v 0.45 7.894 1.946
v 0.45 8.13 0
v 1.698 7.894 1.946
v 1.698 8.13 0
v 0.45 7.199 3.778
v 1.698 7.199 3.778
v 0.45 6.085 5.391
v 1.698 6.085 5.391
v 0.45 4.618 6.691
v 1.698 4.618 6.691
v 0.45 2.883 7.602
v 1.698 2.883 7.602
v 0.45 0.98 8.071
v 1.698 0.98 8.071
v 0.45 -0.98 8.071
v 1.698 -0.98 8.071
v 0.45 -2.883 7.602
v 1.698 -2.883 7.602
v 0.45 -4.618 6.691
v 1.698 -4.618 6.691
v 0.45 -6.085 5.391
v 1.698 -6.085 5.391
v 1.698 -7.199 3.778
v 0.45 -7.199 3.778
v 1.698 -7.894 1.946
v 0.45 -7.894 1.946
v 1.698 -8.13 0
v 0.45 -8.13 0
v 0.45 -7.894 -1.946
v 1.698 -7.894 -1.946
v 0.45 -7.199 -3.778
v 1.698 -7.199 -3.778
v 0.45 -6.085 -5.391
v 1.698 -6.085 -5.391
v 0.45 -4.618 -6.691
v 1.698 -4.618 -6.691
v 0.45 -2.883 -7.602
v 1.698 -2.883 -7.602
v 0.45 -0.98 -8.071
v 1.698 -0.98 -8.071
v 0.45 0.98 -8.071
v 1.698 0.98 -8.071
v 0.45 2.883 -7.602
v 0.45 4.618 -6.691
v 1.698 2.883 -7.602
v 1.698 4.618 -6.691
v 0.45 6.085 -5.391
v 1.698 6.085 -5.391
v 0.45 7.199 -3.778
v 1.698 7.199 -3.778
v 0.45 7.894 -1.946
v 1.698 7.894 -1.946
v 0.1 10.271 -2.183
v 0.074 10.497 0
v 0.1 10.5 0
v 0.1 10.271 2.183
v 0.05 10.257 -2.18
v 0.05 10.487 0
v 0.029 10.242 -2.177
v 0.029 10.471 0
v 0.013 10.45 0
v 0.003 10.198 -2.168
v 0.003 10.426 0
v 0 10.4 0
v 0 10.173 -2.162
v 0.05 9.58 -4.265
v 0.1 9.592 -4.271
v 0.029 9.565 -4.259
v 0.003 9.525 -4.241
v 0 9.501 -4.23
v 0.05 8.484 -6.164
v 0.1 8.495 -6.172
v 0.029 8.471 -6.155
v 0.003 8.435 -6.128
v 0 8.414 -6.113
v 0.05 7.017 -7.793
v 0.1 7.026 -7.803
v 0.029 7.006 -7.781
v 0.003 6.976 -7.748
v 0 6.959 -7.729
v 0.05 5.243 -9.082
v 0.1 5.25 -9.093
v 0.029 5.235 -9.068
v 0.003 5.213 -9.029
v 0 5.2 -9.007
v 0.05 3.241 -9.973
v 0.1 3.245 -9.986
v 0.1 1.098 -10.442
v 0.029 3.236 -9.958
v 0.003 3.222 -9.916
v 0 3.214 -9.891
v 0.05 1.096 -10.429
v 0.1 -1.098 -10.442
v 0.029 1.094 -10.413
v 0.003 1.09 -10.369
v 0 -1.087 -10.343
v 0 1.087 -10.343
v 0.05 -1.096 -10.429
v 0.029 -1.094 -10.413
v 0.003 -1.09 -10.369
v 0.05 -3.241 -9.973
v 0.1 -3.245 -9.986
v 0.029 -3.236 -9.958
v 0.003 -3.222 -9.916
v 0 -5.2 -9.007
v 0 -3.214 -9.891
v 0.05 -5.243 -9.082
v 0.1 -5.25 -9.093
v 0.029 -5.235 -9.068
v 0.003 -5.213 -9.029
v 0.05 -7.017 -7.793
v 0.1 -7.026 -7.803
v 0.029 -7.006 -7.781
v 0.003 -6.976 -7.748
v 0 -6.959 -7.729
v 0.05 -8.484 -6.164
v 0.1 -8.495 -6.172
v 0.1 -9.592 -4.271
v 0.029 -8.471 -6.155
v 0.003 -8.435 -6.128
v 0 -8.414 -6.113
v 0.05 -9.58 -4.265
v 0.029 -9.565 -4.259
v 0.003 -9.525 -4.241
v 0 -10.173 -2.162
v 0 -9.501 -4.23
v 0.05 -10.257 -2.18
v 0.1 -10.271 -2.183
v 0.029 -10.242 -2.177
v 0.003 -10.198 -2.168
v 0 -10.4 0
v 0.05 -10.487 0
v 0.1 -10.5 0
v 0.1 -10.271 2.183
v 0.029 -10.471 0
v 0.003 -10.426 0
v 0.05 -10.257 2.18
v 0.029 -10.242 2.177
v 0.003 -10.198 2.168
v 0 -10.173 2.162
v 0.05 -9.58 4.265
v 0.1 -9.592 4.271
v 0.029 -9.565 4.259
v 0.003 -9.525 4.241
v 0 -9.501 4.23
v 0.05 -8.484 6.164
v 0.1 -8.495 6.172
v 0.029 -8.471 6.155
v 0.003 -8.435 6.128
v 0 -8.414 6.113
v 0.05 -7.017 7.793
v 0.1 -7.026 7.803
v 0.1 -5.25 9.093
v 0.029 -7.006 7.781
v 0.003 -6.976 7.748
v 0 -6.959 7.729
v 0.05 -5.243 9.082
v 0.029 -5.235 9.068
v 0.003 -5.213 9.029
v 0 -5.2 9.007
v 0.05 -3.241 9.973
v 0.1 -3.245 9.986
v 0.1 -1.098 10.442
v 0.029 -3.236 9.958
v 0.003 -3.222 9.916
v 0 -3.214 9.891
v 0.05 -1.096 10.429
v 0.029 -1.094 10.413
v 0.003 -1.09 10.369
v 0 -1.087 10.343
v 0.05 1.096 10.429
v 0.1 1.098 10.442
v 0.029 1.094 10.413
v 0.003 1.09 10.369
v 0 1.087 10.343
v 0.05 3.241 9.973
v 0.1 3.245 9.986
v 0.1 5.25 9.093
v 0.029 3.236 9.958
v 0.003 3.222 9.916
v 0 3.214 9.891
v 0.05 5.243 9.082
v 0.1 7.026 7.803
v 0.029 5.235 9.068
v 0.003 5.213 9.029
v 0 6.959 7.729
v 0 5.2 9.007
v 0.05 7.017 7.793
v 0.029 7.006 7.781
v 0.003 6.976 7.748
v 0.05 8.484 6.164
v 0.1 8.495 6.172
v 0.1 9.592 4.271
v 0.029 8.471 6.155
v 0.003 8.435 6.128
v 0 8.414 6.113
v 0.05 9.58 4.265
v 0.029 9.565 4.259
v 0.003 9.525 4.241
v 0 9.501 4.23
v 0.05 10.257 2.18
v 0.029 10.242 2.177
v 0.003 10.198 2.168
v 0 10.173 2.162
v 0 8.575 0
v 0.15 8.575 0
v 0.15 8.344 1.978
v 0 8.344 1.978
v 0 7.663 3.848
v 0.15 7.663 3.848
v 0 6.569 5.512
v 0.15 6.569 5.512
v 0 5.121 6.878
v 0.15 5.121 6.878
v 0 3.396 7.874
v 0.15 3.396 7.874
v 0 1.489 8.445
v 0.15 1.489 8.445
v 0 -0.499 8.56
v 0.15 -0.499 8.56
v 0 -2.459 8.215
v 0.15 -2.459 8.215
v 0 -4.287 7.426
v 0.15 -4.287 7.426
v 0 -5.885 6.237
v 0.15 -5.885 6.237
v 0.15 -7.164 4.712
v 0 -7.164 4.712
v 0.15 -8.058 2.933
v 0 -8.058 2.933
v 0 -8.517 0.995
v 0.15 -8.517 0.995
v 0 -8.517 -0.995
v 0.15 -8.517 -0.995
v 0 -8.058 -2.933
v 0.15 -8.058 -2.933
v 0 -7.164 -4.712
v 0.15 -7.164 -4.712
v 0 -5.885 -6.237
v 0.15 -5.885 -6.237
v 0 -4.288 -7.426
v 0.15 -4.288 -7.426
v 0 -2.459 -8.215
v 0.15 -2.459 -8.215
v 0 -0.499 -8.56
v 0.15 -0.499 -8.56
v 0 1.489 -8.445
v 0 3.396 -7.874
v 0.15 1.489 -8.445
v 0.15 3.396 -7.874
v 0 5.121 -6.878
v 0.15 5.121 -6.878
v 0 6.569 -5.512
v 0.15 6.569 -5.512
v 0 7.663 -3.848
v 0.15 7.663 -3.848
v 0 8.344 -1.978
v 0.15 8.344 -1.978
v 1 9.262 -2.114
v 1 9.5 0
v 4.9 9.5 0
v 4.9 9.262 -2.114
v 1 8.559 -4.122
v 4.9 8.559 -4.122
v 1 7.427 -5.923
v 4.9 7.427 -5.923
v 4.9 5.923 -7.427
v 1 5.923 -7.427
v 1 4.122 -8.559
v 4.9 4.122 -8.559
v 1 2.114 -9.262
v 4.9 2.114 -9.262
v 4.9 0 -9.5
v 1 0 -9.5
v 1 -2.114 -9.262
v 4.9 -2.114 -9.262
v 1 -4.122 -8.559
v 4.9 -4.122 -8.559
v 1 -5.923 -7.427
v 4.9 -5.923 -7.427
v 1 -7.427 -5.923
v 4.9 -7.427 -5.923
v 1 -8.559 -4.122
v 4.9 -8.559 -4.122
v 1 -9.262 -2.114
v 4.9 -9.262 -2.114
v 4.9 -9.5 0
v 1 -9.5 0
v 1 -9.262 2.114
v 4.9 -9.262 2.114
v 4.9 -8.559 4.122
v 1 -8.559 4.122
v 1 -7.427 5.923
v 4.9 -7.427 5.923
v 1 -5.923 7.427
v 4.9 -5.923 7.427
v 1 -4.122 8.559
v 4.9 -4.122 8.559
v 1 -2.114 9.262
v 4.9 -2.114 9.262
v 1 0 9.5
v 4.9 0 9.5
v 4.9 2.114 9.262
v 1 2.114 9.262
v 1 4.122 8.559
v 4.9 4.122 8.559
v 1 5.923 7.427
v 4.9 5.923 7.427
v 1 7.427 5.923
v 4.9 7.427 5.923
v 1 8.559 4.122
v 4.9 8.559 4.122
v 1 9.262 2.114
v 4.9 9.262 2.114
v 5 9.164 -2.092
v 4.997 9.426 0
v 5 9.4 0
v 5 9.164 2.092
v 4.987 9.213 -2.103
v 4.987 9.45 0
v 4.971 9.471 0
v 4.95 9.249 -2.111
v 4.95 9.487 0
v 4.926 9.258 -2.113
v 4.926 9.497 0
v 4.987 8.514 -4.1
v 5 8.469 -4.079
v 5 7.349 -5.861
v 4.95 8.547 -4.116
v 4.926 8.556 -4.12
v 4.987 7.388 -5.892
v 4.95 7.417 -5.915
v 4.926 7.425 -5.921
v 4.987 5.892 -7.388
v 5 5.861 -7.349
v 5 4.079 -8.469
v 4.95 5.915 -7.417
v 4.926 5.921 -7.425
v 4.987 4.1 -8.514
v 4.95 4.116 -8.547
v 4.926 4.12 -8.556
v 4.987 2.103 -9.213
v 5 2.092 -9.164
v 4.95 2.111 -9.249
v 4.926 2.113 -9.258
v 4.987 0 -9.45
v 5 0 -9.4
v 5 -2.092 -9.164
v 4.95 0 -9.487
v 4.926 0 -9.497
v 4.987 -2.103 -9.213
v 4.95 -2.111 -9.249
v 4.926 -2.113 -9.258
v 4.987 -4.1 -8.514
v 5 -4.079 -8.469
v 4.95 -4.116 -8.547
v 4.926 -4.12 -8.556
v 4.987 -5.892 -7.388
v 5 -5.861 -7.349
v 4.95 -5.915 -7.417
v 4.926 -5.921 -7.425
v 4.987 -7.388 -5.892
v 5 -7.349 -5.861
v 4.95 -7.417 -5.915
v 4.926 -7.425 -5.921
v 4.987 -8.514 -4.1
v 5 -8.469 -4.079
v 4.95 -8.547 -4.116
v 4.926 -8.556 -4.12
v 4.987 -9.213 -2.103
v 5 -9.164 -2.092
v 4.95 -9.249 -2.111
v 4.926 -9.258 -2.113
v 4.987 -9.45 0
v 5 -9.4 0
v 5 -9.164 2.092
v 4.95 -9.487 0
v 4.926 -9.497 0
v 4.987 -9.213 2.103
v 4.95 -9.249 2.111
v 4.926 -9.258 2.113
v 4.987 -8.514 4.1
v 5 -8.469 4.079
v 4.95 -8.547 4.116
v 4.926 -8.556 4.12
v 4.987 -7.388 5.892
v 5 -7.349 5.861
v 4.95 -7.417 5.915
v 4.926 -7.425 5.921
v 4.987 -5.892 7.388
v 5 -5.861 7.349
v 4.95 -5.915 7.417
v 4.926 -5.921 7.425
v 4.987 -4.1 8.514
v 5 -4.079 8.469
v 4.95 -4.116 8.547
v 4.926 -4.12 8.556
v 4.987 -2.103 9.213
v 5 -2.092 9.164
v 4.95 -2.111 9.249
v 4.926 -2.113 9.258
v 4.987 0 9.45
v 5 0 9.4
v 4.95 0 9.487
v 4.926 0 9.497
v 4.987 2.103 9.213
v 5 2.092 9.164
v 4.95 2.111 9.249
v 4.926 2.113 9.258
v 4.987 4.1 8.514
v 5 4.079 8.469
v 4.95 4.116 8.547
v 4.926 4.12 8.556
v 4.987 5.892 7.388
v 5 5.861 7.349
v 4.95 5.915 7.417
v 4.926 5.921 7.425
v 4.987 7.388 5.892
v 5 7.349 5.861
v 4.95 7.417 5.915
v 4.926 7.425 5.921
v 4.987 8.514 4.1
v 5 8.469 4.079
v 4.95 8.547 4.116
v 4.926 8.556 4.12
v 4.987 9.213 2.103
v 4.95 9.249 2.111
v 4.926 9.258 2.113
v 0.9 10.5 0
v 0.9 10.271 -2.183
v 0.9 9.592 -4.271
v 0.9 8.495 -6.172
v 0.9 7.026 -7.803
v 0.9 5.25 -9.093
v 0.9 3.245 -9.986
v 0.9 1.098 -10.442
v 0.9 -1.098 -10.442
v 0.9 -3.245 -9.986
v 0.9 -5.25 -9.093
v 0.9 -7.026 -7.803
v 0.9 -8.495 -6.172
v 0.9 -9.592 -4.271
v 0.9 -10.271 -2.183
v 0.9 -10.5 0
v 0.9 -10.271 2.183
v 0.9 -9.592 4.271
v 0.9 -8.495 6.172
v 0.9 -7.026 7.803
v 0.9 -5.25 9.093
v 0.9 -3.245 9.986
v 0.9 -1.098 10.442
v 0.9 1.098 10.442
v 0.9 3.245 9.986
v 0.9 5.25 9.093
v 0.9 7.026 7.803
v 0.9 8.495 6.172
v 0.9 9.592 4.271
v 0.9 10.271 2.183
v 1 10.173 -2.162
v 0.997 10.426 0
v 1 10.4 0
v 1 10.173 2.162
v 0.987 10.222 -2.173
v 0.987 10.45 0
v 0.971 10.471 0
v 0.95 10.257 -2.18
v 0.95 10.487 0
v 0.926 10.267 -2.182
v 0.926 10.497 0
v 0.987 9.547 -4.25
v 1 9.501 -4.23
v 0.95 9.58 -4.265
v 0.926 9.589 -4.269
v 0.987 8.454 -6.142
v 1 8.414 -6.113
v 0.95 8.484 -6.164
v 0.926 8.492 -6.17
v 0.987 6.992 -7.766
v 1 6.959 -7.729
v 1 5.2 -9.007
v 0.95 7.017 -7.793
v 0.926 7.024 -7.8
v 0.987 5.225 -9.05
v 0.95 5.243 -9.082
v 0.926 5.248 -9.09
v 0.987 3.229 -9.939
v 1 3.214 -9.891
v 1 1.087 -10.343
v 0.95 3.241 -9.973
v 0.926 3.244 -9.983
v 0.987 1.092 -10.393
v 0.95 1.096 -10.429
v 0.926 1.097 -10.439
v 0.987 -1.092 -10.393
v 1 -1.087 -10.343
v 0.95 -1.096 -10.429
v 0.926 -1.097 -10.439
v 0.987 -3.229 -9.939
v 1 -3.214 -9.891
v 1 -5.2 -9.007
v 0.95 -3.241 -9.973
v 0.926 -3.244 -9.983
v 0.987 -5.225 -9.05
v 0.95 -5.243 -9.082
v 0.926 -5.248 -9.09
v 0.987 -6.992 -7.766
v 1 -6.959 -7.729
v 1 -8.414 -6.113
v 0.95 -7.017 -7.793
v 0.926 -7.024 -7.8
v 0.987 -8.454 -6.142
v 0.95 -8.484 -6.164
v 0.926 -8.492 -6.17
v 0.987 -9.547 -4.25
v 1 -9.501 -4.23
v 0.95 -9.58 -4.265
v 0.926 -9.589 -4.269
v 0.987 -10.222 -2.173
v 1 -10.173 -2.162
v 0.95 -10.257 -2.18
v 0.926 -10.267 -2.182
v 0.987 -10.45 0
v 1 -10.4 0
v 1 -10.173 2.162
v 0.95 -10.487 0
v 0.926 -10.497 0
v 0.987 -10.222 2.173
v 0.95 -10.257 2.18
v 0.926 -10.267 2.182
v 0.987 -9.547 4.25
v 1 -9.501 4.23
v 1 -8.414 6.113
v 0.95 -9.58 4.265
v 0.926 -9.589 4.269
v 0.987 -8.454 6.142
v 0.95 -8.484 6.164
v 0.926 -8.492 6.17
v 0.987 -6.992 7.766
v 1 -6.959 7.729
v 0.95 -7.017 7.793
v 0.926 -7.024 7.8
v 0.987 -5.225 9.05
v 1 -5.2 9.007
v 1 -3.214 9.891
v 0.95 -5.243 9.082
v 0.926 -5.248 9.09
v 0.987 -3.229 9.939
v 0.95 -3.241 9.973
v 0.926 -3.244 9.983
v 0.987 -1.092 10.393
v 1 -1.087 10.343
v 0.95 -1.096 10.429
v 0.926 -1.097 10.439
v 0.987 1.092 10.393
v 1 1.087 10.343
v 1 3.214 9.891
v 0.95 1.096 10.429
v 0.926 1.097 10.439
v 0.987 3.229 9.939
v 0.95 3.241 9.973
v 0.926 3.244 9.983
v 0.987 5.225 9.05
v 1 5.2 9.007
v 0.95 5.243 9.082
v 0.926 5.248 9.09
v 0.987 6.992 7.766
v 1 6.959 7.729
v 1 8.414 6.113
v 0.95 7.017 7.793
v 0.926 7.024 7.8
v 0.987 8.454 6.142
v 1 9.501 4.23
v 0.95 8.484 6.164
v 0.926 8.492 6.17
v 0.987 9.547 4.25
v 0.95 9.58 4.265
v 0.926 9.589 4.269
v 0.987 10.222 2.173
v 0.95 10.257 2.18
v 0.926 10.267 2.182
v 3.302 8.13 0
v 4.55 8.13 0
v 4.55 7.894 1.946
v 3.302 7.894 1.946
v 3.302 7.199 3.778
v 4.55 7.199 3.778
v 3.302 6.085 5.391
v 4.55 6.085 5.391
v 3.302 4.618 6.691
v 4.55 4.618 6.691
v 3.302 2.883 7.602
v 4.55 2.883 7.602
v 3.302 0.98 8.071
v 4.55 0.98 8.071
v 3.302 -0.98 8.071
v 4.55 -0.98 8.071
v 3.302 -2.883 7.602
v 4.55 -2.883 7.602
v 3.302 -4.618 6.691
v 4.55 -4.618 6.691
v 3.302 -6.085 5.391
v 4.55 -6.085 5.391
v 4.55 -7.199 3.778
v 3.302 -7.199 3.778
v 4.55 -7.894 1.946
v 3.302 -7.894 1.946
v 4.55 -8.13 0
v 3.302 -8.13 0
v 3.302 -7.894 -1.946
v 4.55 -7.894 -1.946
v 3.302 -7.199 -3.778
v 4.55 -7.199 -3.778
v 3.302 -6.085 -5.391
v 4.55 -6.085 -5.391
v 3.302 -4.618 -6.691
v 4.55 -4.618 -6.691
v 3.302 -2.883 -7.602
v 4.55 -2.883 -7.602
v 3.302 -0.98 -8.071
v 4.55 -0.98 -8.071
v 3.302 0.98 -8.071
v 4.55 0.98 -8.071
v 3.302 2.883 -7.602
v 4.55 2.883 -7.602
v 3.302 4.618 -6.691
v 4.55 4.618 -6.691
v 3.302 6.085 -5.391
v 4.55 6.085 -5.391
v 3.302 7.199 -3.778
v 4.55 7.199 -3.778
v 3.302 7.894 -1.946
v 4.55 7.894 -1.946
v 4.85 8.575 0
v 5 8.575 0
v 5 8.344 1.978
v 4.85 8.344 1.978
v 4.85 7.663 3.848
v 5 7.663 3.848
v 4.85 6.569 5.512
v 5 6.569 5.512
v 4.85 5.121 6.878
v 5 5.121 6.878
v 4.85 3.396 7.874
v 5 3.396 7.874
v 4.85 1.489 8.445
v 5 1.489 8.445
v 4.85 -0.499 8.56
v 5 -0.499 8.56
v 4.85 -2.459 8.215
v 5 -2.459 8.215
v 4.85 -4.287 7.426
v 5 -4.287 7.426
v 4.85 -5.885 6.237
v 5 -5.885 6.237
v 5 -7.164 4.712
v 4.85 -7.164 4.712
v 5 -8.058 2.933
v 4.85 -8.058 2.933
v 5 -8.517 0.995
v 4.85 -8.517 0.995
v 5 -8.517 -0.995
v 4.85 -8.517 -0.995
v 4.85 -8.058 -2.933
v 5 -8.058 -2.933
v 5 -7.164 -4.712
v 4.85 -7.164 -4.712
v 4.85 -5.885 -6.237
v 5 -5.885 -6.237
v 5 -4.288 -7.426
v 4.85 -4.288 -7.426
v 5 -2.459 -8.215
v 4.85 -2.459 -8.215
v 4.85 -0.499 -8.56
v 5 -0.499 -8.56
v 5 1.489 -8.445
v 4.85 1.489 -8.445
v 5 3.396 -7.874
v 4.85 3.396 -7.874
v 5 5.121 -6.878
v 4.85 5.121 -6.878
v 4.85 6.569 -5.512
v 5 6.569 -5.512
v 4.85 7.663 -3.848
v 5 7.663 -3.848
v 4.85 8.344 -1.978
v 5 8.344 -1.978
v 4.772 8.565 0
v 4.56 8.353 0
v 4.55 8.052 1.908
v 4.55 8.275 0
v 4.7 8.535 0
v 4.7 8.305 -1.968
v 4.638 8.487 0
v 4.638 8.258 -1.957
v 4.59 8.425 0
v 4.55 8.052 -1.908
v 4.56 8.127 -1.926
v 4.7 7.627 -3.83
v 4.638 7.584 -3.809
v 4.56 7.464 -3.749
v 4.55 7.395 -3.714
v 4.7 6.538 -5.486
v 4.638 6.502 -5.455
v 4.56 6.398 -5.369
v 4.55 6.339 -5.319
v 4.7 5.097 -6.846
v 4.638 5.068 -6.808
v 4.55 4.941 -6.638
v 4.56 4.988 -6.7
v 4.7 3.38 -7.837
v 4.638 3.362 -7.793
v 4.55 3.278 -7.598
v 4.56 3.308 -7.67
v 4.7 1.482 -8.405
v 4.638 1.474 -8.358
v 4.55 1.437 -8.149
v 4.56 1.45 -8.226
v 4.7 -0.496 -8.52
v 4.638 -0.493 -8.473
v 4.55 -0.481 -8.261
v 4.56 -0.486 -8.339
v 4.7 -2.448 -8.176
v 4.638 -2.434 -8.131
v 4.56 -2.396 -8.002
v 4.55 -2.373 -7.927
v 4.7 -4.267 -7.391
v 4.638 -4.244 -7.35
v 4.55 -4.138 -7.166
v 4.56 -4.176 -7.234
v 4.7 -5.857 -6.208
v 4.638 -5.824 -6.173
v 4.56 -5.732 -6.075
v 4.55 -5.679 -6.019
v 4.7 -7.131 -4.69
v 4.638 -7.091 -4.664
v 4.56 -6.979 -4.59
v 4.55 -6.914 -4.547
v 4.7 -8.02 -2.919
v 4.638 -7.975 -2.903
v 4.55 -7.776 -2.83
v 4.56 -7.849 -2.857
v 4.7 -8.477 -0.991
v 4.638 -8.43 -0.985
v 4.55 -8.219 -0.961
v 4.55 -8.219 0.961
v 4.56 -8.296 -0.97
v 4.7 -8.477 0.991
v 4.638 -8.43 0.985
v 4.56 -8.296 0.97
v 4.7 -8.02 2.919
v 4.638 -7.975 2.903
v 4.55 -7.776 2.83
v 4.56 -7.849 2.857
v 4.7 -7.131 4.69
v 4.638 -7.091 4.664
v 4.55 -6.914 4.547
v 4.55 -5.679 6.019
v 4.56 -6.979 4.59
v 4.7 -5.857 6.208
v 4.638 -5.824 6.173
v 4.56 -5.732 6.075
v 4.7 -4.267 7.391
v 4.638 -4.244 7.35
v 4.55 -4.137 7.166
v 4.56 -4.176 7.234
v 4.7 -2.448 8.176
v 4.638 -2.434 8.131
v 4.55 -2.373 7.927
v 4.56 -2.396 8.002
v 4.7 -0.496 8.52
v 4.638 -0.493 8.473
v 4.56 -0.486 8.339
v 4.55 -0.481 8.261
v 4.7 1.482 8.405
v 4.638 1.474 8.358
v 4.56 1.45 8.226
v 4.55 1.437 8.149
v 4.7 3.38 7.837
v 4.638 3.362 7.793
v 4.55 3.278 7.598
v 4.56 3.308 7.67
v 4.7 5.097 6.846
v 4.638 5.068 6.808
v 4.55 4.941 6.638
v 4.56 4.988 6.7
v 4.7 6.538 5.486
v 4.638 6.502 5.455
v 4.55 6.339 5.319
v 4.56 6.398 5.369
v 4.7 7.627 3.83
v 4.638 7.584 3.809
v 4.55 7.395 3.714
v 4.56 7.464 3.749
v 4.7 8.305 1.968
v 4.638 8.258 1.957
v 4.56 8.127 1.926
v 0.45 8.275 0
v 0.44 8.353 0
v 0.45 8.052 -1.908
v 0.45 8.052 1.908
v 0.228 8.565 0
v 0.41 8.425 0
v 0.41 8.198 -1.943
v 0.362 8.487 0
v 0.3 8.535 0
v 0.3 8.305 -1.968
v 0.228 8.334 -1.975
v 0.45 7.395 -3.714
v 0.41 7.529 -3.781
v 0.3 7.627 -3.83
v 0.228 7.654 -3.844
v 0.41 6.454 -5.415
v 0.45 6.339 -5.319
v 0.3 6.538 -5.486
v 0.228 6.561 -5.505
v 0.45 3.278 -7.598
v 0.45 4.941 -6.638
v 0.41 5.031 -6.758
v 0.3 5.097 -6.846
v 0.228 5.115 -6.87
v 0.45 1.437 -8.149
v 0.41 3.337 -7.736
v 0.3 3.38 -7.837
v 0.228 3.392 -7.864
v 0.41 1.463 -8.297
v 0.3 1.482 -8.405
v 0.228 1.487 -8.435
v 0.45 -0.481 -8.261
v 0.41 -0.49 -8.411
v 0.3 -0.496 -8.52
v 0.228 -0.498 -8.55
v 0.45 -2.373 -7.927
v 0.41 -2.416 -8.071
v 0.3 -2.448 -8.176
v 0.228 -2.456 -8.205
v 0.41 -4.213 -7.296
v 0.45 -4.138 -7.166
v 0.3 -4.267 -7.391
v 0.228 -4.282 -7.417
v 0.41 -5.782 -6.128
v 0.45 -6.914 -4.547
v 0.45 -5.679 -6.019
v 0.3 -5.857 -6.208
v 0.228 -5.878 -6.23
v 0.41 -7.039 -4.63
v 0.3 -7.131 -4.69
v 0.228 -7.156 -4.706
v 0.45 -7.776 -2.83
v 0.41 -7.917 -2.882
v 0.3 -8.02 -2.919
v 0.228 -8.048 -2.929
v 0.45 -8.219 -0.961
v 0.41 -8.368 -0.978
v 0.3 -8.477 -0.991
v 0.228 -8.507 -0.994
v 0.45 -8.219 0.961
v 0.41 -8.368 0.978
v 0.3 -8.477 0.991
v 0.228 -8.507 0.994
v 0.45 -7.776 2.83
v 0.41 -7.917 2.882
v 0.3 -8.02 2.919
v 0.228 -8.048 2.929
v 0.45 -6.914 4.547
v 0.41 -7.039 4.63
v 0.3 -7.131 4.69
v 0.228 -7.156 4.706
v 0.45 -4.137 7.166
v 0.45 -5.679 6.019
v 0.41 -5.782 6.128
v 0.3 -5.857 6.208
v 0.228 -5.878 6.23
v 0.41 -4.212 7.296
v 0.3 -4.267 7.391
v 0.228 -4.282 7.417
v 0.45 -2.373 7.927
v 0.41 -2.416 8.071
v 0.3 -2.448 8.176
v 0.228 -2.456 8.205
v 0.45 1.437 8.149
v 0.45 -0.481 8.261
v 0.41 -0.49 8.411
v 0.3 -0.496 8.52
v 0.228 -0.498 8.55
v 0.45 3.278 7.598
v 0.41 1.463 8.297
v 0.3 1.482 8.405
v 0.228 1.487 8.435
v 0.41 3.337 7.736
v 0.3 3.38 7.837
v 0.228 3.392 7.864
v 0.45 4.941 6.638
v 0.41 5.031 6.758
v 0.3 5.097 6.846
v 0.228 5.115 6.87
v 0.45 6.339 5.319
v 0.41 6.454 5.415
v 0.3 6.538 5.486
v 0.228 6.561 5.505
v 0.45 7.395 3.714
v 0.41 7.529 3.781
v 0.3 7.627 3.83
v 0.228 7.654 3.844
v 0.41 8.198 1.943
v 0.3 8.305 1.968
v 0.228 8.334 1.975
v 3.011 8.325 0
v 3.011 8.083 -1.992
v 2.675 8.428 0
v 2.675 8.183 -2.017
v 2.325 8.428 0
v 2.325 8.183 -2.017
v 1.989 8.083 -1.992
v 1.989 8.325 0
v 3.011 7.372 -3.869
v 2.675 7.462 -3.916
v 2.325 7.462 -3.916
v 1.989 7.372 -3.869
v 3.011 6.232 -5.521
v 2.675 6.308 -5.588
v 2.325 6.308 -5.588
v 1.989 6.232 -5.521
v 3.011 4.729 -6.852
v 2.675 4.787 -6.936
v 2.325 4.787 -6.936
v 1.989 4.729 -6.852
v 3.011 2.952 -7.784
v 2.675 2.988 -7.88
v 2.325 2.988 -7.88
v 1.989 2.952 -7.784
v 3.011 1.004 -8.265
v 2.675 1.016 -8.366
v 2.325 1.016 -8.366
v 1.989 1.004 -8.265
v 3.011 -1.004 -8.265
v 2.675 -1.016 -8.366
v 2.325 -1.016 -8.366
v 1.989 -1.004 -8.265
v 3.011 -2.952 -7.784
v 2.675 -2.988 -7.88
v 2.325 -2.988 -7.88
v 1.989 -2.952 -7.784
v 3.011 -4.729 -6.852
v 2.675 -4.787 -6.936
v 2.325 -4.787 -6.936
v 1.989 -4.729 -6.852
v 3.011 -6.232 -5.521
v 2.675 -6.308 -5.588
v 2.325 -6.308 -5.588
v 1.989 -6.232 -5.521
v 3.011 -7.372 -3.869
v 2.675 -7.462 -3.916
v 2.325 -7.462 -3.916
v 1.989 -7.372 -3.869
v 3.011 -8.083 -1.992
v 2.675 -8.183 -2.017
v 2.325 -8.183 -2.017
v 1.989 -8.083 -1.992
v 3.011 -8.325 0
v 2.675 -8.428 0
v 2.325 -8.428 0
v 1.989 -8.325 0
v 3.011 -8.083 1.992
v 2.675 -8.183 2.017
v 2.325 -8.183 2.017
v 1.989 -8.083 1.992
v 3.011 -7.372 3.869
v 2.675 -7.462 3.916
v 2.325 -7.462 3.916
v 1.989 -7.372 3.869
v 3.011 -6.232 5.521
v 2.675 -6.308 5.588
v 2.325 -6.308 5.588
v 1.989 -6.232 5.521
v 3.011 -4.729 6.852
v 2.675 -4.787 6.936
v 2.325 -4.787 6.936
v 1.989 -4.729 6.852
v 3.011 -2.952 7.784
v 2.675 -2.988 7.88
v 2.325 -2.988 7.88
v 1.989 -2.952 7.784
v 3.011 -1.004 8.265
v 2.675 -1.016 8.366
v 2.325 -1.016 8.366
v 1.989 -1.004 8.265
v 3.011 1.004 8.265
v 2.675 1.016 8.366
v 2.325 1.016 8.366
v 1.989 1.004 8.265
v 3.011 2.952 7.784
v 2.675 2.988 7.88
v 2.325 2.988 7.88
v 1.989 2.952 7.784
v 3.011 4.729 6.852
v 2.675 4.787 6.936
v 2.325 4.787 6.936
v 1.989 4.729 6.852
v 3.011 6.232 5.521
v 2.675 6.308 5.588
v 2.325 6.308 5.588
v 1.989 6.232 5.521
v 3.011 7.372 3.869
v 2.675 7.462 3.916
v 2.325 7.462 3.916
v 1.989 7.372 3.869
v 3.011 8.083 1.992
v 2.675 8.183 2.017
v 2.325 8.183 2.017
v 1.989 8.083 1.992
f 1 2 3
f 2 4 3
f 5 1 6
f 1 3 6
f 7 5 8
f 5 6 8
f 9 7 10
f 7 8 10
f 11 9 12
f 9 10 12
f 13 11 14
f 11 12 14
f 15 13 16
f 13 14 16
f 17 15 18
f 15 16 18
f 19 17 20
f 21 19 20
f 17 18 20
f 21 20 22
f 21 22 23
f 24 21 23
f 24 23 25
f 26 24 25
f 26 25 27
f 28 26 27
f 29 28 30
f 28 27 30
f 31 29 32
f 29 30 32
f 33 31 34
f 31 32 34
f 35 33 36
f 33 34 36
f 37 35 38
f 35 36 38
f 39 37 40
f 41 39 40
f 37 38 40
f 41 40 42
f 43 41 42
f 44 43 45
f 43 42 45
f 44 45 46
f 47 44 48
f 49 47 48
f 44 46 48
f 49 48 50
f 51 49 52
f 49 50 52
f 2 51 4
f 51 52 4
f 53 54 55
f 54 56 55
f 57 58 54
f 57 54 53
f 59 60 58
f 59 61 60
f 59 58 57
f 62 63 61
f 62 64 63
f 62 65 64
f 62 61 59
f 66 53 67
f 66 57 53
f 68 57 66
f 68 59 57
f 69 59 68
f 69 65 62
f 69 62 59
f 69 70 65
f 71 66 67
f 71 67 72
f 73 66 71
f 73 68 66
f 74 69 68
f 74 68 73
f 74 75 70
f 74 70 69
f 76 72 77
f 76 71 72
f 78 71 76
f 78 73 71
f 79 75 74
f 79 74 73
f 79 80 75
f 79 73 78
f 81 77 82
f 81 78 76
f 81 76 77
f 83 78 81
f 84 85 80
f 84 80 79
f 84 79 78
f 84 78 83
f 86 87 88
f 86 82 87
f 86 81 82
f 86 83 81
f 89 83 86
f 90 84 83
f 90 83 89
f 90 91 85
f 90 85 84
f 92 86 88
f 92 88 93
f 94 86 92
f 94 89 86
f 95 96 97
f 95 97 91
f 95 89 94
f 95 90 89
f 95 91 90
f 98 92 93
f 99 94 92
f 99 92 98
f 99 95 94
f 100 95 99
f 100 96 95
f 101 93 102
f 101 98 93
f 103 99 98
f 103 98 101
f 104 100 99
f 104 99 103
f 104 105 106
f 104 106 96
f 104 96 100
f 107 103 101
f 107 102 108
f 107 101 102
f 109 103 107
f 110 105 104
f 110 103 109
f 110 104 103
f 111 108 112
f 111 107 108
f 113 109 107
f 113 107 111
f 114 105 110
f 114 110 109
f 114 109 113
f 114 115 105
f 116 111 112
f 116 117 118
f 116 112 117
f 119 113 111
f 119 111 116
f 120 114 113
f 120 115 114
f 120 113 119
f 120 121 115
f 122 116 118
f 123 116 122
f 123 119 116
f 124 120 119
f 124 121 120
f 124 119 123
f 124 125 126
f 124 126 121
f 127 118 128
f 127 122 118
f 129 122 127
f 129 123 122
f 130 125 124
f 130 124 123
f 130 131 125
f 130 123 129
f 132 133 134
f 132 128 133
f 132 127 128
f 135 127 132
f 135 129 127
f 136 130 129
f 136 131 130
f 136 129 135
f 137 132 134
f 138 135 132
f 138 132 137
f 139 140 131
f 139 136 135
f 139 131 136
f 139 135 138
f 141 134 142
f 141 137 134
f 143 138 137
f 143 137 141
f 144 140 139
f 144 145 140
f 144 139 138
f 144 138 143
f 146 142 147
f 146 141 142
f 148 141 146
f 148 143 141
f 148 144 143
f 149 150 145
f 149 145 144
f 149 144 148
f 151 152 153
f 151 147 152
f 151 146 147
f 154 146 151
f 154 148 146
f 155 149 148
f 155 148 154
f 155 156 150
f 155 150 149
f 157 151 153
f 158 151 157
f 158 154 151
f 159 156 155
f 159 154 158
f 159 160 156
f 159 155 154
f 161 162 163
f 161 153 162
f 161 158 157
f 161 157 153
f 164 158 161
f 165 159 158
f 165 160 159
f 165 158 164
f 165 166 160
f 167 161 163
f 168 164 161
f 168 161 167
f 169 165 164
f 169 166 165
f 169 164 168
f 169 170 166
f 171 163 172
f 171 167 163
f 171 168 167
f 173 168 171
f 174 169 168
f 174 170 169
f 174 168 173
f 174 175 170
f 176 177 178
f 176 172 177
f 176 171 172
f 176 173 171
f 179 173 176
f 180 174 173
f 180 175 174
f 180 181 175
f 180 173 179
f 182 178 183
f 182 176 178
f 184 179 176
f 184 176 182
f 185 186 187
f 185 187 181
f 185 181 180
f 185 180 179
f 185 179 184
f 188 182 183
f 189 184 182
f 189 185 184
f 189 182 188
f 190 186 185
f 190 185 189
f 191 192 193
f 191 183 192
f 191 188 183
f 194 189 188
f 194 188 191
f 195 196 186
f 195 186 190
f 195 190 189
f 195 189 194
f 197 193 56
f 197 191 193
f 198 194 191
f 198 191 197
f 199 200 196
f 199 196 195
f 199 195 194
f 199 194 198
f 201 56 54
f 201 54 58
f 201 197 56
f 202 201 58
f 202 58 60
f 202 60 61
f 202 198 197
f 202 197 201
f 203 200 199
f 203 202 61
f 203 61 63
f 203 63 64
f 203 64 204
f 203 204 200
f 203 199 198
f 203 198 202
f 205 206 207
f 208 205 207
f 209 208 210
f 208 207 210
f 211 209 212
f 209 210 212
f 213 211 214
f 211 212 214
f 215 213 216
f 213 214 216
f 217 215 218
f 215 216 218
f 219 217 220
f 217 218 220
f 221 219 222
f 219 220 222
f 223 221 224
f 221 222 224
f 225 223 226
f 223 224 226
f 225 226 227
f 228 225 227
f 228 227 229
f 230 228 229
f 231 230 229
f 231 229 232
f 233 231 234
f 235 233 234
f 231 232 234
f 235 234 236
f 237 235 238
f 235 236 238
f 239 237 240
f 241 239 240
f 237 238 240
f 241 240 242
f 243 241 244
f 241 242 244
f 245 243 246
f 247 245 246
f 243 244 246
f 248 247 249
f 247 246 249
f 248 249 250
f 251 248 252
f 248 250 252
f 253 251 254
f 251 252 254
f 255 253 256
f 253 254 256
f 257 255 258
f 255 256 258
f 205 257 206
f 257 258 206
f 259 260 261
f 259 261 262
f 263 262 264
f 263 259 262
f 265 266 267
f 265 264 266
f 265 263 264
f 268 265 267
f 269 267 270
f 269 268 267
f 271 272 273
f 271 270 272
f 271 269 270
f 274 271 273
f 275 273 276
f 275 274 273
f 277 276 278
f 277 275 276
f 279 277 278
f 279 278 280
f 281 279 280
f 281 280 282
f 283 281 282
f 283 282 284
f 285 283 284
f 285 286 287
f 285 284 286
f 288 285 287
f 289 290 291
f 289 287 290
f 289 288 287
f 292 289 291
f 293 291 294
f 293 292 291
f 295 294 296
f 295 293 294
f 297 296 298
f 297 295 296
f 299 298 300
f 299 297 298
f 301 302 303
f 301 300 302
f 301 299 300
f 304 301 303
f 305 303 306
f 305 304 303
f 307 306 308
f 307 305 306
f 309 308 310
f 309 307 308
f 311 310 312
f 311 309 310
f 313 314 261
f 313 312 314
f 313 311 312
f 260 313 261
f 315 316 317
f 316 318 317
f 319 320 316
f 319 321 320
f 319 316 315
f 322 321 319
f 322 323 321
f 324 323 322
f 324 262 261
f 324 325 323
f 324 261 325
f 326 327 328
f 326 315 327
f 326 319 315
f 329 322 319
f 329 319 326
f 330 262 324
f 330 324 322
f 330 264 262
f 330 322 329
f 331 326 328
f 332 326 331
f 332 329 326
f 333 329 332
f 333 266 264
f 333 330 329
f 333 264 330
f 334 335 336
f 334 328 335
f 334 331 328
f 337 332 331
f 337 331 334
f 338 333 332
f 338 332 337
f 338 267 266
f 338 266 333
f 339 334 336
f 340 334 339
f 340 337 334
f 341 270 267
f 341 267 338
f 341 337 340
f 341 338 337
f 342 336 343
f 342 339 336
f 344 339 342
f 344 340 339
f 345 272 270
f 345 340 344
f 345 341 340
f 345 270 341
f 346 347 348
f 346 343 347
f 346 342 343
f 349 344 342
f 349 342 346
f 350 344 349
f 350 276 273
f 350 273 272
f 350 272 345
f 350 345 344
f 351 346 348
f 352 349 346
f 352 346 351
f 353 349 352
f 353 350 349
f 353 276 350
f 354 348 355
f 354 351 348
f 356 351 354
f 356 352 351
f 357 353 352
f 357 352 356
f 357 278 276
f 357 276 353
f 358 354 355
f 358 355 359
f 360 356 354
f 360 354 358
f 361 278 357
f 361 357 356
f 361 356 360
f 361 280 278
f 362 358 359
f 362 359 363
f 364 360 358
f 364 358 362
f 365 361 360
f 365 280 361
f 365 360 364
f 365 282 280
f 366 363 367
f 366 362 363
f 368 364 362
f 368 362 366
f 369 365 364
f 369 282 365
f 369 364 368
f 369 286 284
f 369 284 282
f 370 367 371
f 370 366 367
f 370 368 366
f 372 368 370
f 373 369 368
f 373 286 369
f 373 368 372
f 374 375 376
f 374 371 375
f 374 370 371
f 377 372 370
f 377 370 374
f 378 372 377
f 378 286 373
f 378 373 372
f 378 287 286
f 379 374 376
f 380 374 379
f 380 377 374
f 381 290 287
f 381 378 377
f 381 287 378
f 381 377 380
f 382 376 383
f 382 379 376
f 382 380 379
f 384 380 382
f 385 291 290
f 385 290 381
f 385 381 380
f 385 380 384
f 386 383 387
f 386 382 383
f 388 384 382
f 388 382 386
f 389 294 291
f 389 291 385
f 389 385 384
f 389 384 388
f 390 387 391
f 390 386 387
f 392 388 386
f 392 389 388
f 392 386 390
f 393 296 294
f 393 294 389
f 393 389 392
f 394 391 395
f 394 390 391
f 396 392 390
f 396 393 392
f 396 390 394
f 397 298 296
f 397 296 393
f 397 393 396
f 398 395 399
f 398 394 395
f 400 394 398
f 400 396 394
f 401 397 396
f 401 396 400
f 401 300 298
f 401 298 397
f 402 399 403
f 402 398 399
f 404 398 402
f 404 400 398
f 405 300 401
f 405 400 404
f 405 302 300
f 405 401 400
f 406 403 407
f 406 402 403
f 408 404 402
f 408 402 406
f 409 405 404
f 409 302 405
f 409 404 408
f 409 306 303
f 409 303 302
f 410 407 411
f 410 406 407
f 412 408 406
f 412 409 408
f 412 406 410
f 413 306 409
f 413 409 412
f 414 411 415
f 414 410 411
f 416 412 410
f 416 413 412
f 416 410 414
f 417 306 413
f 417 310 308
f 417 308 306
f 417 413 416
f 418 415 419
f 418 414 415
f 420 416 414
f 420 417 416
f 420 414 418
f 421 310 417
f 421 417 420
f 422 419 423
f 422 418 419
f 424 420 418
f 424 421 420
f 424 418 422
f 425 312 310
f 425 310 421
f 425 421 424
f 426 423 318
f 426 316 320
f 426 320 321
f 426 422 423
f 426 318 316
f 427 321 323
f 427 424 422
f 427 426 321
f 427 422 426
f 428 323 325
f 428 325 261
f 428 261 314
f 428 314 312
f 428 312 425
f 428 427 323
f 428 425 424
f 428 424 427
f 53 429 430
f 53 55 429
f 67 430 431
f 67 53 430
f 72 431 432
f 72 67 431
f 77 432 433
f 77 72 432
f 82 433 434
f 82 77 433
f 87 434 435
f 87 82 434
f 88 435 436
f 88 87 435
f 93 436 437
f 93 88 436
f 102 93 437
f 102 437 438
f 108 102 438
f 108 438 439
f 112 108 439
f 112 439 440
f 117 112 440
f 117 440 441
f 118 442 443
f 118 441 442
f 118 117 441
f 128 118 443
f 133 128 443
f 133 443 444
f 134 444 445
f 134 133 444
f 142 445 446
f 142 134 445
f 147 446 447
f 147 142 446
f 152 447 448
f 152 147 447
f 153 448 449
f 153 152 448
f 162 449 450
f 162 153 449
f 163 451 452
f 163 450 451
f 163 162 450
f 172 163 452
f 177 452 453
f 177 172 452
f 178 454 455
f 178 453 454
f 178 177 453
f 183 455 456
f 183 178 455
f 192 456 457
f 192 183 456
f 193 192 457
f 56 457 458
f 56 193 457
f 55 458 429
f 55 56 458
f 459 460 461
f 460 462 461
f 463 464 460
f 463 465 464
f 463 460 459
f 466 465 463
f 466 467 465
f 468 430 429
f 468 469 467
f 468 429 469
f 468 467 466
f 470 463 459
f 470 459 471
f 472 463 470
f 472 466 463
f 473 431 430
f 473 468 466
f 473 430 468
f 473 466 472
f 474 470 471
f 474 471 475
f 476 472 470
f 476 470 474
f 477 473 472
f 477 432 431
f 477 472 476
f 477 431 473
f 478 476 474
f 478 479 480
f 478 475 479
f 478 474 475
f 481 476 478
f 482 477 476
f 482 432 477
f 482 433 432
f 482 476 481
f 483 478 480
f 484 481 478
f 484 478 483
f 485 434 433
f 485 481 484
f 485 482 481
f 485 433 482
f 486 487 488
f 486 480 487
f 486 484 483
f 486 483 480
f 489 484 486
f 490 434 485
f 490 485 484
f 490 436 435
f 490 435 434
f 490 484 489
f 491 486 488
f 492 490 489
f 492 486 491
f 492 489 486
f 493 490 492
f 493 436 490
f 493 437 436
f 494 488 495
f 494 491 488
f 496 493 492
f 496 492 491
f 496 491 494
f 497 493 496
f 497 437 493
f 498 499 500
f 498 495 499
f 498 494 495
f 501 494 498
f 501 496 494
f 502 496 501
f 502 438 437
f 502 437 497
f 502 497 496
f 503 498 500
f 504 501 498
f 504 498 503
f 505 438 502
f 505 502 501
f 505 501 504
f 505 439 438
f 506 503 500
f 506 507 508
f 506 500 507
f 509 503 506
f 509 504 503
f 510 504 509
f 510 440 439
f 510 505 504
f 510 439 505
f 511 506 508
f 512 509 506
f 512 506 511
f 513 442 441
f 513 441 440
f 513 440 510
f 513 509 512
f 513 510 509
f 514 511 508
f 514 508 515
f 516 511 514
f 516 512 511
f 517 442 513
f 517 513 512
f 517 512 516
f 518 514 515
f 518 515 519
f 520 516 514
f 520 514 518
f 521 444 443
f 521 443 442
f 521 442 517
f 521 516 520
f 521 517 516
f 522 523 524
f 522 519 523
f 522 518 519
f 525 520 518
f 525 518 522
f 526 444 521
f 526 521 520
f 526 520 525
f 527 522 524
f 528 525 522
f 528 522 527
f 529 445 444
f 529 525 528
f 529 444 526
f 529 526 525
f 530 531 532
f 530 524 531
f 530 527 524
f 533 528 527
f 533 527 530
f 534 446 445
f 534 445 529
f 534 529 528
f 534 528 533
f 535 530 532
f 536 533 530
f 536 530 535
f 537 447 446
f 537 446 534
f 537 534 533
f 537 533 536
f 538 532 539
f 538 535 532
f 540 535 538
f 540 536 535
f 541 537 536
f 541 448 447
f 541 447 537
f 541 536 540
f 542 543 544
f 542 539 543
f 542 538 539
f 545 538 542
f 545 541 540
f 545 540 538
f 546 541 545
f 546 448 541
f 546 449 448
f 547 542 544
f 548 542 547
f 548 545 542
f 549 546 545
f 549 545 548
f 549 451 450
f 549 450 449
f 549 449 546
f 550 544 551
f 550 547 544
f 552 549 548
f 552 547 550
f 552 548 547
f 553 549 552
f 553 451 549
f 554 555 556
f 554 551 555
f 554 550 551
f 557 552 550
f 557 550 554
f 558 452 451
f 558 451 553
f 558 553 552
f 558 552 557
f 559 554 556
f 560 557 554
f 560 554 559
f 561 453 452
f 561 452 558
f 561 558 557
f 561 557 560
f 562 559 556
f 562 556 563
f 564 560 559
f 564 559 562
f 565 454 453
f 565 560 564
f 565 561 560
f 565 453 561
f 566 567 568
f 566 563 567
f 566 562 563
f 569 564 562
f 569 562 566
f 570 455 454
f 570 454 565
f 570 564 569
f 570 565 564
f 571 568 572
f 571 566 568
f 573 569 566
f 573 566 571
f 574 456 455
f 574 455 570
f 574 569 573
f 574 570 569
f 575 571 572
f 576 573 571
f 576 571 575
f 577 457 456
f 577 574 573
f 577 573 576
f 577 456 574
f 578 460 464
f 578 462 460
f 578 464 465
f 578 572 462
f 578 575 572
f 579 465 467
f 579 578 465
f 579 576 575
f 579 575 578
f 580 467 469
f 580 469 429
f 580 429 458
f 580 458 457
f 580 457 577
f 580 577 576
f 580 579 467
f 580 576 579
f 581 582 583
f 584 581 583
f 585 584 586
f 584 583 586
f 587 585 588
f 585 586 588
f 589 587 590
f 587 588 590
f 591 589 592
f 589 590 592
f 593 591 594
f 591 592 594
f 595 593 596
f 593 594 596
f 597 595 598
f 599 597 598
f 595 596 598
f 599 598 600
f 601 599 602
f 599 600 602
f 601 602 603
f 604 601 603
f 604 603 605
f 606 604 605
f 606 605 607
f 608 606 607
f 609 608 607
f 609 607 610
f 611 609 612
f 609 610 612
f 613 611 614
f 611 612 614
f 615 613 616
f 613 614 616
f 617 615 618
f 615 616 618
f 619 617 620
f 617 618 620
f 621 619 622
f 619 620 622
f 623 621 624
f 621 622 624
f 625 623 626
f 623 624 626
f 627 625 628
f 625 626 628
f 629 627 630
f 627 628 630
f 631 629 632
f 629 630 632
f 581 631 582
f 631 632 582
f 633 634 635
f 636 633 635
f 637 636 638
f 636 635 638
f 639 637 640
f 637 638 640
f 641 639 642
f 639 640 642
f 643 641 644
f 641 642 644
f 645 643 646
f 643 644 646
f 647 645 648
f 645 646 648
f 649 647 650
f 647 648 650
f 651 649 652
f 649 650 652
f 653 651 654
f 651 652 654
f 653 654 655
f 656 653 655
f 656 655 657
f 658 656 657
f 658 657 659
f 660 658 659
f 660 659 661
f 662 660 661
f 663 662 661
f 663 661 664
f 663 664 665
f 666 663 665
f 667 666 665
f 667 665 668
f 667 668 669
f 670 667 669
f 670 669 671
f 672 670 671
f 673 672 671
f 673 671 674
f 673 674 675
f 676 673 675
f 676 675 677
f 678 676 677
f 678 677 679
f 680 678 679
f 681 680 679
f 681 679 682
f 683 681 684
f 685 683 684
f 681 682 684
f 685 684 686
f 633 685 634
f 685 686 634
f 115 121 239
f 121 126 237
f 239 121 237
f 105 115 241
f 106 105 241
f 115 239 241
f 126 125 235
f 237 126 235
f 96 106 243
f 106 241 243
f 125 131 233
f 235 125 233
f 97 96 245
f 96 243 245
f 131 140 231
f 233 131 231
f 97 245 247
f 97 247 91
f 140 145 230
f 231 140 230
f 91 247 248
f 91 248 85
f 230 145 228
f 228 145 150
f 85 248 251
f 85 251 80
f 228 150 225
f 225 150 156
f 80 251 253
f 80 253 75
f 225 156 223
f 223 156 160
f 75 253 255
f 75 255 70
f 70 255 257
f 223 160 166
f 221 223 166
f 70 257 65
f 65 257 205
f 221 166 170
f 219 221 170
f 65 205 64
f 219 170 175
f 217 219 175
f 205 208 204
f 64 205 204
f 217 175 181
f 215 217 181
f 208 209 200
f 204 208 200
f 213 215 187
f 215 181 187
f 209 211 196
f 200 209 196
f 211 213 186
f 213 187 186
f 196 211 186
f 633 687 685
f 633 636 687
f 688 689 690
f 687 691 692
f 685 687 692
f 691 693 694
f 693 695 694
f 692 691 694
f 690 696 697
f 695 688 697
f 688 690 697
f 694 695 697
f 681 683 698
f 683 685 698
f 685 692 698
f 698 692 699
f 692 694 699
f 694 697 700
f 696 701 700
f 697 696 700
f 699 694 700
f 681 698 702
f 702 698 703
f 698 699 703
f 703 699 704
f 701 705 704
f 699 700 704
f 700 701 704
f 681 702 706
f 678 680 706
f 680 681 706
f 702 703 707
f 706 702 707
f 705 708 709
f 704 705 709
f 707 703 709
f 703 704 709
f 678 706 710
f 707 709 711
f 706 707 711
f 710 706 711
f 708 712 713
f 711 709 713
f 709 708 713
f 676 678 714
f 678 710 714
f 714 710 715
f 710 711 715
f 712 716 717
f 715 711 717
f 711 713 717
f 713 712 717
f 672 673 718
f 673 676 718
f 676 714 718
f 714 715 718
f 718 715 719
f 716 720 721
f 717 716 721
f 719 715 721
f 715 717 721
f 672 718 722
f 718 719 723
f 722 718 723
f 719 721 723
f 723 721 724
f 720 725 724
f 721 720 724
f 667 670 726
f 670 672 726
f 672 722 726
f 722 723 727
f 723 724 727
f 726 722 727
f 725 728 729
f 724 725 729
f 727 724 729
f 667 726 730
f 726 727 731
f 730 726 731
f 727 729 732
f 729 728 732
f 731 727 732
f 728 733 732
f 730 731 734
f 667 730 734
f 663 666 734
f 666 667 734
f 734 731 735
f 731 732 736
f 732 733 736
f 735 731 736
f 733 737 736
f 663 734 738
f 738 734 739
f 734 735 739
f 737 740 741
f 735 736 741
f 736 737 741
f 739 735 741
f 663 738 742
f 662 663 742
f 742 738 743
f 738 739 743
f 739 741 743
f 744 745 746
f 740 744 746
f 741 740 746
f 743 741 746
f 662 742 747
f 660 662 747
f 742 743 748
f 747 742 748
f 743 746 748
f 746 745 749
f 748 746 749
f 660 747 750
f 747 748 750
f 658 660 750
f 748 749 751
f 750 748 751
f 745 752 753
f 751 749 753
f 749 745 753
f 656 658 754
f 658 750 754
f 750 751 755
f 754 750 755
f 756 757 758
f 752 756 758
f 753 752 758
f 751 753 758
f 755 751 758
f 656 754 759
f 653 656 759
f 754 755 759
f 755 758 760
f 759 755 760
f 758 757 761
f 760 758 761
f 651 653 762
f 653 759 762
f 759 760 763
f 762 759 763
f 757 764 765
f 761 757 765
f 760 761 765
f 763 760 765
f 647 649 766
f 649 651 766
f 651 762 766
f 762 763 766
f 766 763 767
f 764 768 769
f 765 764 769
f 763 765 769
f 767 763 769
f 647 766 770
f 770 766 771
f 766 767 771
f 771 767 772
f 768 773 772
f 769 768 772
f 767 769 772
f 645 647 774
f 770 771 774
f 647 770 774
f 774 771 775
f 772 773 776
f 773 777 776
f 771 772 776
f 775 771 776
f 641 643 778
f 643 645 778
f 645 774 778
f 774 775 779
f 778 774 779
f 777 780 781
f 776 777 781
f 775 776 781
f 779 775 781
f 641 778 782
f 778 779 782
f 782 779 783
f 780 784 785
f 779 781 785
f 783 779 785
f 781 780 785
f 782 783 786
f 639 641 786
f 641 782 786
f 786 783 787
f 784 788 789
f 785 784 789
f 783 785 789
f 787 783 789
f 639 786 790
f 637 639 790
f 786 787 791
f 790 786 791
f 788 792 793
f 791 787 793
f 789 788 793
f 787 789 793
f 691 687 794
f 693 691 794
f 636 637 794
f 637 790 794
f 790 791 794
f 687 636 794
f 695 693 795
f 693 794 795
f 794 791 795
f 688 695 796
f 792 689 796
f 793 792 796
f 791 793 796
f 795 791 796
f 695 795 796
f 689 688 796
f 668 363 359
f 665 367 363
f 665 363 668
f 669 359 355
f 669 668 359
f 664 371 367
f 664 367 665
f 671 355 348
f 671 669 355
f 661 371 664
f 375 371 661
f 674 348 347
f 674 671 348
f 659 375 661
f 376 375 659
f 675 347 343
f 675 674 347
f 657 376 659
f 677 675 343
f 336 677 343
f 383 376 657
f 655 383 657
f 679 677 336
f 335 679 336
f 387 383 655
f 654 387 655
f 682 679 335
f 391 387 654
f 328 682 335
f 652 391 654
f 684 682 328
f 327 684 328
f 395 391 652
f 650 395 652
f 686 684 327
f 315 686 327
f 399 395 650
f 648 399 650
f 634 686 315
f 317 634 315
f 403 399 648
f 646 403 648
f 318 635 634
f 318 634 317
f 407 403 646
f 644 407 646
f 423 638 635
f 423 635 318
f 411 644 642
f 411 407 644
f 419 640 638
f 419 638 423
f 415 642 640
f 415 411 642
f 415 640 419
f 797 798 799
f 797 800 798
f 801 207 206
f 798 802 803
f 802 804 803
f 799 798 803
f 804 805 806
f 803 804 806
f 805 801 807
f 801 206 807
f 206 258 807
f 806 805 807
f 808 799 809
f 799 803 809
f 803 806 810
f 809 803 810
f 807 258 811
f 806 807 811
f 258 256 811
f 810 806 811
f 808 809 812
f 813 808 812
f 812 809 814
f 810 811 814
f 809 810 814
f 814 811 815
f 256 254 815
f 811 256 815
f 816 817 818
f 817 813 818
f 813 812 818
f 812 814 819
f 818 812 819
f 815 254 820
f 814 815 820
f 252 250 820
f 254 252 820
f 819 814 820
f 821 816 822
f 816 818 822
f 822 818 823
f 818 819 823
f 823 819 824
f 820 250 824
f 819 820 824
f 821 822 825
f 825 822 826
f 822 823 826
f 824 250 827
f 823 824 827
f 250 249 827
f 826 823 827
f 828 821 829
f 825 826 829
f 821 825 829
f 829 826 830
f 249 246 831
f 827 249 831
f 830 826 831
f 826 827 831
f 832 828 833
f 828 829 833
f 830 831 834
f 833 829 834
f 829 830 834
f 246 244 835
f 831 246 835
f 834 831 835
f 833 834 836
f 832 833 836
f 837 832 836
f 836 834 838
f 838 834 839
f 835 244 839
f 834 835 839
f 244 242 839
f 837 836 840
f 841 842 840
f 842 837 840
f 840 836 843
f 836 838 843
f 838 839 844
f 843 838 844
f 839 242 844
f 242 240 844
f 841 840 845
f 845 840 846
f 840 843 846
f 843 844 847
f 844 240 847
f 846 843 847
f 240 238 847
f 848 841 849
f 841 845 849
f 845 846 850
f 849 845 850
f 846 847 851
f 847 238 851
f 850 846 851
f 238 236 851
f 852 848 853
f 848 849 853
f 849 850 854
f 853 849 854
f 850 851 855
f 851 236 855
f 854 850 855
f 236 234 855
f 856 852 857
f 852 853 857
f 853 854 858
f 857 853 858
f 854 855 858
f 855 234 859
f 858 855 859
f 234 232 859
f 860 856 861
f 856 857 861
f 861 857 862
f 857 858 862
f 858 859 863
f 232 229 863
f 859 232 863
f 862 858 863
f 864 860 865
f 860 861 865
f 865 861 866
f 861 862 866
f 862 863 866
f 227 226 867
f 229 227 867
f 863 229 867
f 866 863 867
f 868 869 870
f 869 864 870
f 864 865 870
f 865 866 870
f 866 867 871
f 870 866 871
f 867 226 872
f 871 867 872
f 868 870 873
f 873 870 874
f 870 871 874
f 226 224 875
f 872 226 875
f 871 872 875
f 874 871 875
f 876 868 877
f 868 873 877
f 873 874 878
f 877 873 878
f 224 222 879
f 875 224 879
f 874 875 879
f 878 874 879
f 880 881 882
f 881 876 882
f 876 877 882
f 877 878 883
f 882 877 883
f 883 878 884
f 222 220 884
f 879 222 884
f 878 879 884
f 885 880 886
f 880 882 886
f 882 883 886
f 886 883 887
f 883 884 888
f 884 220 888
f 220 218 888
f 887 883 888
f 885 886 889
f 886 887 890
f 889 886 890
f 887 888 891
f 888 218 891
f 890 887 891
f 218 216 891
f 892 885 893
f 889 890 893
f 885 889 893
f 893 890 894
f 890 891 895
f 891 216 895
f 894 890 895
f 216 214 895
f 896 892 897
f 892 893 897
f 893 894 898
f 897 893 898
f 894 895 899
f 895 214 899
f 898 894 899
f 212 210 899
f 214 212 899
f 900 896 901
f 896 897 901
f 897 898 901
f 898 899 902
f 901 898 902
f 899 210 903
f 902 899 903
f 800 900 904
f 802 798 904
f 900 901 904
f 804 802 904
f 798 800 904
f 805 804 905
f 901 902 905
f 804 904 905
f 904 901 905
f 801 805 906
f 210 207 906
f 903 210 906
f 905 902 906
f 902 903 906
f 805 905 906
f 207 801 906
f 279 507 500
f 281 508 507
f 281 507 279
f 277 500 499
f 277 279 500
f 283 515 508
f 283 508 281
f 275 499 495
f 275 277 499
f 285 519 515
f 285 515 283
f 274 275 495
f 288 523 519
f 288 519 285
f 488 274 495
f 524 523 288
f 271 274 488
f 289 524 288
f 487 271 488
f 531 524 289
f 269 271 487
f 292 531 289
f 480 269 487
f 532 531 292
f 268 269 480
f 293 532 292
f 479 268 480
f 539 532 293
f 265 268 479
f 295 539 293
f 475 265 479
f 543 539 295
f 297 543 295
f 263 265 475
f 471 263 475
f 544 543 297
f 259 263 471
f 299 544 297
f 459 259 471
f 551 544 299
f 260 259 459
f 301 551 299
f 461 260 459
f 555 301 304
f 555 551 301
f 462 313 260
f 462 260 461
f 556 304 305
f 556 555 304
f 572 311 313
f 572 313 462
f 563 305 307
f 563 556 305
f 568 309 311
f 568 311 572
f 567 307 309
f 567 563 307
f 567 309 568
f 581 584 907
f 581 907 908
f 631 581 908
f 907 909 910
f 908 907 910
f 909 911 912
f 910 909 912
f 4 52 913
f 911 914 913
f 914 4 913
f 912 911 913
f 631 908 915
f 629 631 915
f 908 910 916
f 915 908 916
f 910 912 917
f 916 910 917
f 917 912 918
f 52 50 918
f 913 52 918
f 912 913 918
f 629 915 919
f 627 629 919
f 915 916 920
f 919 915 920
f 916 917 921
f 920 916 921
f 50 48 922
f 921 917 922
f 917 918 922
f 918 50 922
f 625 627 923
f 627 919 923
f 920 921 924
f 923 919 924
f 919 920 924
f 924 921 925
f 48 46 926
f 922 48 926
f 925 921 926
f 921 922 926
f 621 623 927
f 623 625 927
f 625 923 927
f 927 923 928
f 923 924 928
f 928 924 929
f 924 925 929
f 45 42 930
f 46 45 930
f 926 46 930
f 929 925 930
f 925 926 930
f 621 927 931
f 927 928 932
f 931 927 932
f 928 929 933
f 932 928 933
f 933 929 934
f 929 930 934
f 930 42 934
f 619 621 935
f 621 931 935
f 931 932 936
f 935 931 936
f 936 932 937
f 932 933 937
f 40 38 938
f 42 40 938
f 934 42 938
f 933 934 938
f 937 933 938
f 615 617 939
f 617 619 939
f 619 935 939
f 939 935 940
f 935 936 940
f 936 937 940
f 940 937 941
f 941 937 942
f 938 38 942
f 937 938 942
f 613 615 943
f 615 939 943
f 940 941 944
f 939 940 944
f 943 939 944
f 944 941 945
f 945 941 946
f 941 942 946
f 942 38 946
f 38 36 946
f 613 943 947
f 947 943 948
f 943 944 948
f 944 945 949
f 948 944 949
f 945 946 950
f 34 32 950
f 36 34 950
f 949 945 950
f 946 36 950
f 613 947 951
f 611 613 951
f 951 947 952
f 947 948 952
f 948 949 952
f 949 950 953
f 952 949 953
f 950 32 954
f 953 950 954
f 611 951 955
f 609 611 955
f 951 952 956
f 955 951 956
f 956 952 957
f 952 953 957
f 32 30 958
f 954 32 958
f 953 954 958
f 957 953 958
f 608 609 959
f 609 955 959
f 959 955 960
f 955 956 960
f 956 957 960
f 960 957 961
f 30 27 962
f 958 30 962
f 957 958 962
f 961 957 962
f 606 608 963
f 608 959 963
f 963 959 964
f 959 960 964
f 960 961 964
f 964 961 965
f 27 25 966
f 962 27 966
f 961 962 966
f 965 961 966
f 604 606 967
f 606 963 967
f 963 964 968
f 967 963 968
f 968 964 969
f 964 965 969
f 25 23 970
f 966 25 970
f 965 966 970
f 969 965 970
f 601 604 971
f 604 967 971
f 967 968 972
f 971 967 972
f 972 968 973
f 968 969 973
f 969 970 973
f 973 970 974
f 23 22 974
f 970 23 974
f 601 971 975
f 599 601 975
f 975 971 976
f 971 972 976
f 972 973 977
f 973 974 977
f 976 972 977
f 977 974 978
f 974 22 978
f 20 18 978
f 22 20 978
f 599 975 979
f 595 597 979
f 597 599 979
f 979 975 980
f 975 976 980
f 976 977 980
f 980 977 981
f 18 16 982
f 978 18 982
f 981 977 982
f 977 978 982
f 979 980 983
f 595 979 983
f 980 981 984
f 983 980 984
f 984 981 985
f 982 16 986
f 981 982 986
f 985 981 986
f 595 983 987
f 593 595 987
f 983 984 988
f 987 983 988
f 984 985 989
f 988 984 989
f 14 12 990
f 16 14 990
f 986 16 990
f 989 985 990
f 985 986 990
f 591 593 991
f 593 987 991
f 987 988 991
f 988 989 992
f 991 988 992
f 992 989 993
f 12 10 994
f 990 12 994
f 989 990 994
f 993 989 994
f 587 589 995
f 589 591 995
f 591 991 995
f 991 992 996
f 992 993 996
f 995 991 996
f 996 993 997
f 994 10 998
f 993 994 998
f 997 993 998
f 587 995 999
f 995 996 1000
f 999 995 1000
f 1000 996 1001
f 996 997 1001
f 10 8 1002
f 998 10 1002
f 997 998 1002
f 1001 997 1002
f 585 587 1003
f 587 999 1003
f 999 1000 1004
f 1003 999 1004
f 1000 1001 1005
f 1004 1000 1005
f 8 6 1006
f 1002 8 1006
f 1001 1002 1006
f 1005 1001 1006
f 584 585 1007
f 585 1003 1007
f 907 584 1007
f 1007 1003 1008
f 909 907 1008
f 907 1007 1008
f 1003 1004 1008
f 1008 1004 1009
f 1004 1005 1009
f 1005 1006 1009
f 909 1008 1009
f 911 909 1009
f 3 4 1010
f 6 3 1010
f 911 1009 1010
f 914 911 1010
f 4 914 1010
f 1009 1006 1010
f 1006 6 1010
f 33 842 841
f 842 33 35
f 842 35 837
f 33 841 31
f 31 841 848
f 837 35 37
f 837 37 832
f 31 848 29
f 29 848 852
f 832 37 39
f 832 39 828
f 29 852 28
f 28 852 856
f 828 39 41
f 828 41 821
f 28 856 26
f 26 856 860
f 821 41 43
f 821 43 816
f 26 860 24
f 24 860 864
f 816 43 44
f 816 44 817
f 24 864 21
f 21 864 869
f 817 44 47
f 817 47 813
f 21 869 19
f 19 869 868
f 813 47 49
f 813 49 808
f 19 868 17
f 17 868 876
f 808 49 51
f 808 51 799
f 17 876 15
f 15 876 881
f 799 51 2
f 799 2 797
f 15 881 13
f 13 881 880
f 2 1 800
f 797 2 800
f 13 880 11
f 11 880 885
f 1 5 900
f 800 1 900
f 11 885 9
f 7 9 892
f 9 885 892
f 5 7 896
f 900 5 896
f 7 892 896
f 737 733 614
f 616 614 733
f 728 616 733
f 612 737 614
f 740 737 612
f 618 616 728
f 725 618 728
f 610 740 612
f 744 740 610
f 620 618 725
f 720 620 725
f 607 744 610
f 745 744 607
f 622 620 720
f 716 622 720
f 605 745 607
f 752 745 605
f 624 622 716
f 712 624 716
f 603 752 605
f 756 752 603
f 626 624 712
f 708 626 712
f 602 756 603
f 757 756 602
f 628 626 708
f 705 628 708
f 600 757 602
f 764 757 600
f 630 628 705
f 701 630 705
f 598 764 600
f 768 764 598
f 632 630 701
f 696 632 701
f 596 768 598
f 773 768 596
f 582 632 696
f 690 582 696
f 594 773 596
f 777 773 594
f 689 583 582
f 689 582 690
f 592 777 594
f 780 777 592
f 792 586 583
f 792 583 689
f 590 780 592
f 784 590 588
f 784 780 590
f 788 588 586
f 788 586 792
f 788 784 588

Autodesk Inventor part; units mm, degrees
ref_plane "YZ Plane" through (0, 0, 0) normal (1, 0, 0) x (0, 1, 0)
ref_plane "XZ Plane" through (0, 0, 0) normal (0, 1, 0) x (-1, 0, 0)
ref_plane "XY Plane" through (0, 0, 0) normal (0, 0, 1) x (1, 0, 0)
sketch "Sketch_21" plane through (0, 0, 0) normal (0, 0, 1) x (1, 0, 0)
  line L0 (50, 0) -> (-50, 0)
  line L1 (0, 10.4) -> (0, 8.575)
  line L2 (0, 8.575) -> (0.15, 8.575)
  arc A0 (0.45, 8.275) -> (0.15, 8.575) centre (0.15, 8.275) ccw
  line L3 (0.45, 8.275) -> (0.45, 8.13)
  line L4 (0.45, 8.13) -> (1.6982, 8.13)
  arc A1 (3.3018, 8.13) -> (1.6982, 8.13) centre (2.5, 7.25) ccw
  line L5 (3.3018, 8.13) -> (4.55, 8.13)
  line L6 (4.55, 8.13) -> (4.55, 8.275)
  arc A2 (4.85, 8.575) -> (4.55, 8.275) centre (4.85, 8.275) ccw
  line L7 (4.85, 8.575) -> (5, 8.575)
  line L8 (5, 8.575) -> (5, 9.4)
  arc A3 (5, 9.4) -> (4.9, 9.5) centre (4.9, 9.4) ccw
  line L9 (4.9, 9.5) -> (1, 9.5)
  line L10 (1, 9.5) -> (1, 10.4)
  arc A4 (1, 10.4) -> (0.9, 10.5) centre (0.9, 10.4) ccw
  line L11 (0.9, 10.5) -> (0.1, 10.5)
  arc A5 (0.1, 10.5) -> (0, 10.4) centre (0.1, 10.4) ccw
revolve "Revolution1" add sketch "Sketch_21" angle 360 about axis through (50, 0, 0) along (1, 0, 0)
properties part number "SKF_W 61800 R-2RS1_PART2"
